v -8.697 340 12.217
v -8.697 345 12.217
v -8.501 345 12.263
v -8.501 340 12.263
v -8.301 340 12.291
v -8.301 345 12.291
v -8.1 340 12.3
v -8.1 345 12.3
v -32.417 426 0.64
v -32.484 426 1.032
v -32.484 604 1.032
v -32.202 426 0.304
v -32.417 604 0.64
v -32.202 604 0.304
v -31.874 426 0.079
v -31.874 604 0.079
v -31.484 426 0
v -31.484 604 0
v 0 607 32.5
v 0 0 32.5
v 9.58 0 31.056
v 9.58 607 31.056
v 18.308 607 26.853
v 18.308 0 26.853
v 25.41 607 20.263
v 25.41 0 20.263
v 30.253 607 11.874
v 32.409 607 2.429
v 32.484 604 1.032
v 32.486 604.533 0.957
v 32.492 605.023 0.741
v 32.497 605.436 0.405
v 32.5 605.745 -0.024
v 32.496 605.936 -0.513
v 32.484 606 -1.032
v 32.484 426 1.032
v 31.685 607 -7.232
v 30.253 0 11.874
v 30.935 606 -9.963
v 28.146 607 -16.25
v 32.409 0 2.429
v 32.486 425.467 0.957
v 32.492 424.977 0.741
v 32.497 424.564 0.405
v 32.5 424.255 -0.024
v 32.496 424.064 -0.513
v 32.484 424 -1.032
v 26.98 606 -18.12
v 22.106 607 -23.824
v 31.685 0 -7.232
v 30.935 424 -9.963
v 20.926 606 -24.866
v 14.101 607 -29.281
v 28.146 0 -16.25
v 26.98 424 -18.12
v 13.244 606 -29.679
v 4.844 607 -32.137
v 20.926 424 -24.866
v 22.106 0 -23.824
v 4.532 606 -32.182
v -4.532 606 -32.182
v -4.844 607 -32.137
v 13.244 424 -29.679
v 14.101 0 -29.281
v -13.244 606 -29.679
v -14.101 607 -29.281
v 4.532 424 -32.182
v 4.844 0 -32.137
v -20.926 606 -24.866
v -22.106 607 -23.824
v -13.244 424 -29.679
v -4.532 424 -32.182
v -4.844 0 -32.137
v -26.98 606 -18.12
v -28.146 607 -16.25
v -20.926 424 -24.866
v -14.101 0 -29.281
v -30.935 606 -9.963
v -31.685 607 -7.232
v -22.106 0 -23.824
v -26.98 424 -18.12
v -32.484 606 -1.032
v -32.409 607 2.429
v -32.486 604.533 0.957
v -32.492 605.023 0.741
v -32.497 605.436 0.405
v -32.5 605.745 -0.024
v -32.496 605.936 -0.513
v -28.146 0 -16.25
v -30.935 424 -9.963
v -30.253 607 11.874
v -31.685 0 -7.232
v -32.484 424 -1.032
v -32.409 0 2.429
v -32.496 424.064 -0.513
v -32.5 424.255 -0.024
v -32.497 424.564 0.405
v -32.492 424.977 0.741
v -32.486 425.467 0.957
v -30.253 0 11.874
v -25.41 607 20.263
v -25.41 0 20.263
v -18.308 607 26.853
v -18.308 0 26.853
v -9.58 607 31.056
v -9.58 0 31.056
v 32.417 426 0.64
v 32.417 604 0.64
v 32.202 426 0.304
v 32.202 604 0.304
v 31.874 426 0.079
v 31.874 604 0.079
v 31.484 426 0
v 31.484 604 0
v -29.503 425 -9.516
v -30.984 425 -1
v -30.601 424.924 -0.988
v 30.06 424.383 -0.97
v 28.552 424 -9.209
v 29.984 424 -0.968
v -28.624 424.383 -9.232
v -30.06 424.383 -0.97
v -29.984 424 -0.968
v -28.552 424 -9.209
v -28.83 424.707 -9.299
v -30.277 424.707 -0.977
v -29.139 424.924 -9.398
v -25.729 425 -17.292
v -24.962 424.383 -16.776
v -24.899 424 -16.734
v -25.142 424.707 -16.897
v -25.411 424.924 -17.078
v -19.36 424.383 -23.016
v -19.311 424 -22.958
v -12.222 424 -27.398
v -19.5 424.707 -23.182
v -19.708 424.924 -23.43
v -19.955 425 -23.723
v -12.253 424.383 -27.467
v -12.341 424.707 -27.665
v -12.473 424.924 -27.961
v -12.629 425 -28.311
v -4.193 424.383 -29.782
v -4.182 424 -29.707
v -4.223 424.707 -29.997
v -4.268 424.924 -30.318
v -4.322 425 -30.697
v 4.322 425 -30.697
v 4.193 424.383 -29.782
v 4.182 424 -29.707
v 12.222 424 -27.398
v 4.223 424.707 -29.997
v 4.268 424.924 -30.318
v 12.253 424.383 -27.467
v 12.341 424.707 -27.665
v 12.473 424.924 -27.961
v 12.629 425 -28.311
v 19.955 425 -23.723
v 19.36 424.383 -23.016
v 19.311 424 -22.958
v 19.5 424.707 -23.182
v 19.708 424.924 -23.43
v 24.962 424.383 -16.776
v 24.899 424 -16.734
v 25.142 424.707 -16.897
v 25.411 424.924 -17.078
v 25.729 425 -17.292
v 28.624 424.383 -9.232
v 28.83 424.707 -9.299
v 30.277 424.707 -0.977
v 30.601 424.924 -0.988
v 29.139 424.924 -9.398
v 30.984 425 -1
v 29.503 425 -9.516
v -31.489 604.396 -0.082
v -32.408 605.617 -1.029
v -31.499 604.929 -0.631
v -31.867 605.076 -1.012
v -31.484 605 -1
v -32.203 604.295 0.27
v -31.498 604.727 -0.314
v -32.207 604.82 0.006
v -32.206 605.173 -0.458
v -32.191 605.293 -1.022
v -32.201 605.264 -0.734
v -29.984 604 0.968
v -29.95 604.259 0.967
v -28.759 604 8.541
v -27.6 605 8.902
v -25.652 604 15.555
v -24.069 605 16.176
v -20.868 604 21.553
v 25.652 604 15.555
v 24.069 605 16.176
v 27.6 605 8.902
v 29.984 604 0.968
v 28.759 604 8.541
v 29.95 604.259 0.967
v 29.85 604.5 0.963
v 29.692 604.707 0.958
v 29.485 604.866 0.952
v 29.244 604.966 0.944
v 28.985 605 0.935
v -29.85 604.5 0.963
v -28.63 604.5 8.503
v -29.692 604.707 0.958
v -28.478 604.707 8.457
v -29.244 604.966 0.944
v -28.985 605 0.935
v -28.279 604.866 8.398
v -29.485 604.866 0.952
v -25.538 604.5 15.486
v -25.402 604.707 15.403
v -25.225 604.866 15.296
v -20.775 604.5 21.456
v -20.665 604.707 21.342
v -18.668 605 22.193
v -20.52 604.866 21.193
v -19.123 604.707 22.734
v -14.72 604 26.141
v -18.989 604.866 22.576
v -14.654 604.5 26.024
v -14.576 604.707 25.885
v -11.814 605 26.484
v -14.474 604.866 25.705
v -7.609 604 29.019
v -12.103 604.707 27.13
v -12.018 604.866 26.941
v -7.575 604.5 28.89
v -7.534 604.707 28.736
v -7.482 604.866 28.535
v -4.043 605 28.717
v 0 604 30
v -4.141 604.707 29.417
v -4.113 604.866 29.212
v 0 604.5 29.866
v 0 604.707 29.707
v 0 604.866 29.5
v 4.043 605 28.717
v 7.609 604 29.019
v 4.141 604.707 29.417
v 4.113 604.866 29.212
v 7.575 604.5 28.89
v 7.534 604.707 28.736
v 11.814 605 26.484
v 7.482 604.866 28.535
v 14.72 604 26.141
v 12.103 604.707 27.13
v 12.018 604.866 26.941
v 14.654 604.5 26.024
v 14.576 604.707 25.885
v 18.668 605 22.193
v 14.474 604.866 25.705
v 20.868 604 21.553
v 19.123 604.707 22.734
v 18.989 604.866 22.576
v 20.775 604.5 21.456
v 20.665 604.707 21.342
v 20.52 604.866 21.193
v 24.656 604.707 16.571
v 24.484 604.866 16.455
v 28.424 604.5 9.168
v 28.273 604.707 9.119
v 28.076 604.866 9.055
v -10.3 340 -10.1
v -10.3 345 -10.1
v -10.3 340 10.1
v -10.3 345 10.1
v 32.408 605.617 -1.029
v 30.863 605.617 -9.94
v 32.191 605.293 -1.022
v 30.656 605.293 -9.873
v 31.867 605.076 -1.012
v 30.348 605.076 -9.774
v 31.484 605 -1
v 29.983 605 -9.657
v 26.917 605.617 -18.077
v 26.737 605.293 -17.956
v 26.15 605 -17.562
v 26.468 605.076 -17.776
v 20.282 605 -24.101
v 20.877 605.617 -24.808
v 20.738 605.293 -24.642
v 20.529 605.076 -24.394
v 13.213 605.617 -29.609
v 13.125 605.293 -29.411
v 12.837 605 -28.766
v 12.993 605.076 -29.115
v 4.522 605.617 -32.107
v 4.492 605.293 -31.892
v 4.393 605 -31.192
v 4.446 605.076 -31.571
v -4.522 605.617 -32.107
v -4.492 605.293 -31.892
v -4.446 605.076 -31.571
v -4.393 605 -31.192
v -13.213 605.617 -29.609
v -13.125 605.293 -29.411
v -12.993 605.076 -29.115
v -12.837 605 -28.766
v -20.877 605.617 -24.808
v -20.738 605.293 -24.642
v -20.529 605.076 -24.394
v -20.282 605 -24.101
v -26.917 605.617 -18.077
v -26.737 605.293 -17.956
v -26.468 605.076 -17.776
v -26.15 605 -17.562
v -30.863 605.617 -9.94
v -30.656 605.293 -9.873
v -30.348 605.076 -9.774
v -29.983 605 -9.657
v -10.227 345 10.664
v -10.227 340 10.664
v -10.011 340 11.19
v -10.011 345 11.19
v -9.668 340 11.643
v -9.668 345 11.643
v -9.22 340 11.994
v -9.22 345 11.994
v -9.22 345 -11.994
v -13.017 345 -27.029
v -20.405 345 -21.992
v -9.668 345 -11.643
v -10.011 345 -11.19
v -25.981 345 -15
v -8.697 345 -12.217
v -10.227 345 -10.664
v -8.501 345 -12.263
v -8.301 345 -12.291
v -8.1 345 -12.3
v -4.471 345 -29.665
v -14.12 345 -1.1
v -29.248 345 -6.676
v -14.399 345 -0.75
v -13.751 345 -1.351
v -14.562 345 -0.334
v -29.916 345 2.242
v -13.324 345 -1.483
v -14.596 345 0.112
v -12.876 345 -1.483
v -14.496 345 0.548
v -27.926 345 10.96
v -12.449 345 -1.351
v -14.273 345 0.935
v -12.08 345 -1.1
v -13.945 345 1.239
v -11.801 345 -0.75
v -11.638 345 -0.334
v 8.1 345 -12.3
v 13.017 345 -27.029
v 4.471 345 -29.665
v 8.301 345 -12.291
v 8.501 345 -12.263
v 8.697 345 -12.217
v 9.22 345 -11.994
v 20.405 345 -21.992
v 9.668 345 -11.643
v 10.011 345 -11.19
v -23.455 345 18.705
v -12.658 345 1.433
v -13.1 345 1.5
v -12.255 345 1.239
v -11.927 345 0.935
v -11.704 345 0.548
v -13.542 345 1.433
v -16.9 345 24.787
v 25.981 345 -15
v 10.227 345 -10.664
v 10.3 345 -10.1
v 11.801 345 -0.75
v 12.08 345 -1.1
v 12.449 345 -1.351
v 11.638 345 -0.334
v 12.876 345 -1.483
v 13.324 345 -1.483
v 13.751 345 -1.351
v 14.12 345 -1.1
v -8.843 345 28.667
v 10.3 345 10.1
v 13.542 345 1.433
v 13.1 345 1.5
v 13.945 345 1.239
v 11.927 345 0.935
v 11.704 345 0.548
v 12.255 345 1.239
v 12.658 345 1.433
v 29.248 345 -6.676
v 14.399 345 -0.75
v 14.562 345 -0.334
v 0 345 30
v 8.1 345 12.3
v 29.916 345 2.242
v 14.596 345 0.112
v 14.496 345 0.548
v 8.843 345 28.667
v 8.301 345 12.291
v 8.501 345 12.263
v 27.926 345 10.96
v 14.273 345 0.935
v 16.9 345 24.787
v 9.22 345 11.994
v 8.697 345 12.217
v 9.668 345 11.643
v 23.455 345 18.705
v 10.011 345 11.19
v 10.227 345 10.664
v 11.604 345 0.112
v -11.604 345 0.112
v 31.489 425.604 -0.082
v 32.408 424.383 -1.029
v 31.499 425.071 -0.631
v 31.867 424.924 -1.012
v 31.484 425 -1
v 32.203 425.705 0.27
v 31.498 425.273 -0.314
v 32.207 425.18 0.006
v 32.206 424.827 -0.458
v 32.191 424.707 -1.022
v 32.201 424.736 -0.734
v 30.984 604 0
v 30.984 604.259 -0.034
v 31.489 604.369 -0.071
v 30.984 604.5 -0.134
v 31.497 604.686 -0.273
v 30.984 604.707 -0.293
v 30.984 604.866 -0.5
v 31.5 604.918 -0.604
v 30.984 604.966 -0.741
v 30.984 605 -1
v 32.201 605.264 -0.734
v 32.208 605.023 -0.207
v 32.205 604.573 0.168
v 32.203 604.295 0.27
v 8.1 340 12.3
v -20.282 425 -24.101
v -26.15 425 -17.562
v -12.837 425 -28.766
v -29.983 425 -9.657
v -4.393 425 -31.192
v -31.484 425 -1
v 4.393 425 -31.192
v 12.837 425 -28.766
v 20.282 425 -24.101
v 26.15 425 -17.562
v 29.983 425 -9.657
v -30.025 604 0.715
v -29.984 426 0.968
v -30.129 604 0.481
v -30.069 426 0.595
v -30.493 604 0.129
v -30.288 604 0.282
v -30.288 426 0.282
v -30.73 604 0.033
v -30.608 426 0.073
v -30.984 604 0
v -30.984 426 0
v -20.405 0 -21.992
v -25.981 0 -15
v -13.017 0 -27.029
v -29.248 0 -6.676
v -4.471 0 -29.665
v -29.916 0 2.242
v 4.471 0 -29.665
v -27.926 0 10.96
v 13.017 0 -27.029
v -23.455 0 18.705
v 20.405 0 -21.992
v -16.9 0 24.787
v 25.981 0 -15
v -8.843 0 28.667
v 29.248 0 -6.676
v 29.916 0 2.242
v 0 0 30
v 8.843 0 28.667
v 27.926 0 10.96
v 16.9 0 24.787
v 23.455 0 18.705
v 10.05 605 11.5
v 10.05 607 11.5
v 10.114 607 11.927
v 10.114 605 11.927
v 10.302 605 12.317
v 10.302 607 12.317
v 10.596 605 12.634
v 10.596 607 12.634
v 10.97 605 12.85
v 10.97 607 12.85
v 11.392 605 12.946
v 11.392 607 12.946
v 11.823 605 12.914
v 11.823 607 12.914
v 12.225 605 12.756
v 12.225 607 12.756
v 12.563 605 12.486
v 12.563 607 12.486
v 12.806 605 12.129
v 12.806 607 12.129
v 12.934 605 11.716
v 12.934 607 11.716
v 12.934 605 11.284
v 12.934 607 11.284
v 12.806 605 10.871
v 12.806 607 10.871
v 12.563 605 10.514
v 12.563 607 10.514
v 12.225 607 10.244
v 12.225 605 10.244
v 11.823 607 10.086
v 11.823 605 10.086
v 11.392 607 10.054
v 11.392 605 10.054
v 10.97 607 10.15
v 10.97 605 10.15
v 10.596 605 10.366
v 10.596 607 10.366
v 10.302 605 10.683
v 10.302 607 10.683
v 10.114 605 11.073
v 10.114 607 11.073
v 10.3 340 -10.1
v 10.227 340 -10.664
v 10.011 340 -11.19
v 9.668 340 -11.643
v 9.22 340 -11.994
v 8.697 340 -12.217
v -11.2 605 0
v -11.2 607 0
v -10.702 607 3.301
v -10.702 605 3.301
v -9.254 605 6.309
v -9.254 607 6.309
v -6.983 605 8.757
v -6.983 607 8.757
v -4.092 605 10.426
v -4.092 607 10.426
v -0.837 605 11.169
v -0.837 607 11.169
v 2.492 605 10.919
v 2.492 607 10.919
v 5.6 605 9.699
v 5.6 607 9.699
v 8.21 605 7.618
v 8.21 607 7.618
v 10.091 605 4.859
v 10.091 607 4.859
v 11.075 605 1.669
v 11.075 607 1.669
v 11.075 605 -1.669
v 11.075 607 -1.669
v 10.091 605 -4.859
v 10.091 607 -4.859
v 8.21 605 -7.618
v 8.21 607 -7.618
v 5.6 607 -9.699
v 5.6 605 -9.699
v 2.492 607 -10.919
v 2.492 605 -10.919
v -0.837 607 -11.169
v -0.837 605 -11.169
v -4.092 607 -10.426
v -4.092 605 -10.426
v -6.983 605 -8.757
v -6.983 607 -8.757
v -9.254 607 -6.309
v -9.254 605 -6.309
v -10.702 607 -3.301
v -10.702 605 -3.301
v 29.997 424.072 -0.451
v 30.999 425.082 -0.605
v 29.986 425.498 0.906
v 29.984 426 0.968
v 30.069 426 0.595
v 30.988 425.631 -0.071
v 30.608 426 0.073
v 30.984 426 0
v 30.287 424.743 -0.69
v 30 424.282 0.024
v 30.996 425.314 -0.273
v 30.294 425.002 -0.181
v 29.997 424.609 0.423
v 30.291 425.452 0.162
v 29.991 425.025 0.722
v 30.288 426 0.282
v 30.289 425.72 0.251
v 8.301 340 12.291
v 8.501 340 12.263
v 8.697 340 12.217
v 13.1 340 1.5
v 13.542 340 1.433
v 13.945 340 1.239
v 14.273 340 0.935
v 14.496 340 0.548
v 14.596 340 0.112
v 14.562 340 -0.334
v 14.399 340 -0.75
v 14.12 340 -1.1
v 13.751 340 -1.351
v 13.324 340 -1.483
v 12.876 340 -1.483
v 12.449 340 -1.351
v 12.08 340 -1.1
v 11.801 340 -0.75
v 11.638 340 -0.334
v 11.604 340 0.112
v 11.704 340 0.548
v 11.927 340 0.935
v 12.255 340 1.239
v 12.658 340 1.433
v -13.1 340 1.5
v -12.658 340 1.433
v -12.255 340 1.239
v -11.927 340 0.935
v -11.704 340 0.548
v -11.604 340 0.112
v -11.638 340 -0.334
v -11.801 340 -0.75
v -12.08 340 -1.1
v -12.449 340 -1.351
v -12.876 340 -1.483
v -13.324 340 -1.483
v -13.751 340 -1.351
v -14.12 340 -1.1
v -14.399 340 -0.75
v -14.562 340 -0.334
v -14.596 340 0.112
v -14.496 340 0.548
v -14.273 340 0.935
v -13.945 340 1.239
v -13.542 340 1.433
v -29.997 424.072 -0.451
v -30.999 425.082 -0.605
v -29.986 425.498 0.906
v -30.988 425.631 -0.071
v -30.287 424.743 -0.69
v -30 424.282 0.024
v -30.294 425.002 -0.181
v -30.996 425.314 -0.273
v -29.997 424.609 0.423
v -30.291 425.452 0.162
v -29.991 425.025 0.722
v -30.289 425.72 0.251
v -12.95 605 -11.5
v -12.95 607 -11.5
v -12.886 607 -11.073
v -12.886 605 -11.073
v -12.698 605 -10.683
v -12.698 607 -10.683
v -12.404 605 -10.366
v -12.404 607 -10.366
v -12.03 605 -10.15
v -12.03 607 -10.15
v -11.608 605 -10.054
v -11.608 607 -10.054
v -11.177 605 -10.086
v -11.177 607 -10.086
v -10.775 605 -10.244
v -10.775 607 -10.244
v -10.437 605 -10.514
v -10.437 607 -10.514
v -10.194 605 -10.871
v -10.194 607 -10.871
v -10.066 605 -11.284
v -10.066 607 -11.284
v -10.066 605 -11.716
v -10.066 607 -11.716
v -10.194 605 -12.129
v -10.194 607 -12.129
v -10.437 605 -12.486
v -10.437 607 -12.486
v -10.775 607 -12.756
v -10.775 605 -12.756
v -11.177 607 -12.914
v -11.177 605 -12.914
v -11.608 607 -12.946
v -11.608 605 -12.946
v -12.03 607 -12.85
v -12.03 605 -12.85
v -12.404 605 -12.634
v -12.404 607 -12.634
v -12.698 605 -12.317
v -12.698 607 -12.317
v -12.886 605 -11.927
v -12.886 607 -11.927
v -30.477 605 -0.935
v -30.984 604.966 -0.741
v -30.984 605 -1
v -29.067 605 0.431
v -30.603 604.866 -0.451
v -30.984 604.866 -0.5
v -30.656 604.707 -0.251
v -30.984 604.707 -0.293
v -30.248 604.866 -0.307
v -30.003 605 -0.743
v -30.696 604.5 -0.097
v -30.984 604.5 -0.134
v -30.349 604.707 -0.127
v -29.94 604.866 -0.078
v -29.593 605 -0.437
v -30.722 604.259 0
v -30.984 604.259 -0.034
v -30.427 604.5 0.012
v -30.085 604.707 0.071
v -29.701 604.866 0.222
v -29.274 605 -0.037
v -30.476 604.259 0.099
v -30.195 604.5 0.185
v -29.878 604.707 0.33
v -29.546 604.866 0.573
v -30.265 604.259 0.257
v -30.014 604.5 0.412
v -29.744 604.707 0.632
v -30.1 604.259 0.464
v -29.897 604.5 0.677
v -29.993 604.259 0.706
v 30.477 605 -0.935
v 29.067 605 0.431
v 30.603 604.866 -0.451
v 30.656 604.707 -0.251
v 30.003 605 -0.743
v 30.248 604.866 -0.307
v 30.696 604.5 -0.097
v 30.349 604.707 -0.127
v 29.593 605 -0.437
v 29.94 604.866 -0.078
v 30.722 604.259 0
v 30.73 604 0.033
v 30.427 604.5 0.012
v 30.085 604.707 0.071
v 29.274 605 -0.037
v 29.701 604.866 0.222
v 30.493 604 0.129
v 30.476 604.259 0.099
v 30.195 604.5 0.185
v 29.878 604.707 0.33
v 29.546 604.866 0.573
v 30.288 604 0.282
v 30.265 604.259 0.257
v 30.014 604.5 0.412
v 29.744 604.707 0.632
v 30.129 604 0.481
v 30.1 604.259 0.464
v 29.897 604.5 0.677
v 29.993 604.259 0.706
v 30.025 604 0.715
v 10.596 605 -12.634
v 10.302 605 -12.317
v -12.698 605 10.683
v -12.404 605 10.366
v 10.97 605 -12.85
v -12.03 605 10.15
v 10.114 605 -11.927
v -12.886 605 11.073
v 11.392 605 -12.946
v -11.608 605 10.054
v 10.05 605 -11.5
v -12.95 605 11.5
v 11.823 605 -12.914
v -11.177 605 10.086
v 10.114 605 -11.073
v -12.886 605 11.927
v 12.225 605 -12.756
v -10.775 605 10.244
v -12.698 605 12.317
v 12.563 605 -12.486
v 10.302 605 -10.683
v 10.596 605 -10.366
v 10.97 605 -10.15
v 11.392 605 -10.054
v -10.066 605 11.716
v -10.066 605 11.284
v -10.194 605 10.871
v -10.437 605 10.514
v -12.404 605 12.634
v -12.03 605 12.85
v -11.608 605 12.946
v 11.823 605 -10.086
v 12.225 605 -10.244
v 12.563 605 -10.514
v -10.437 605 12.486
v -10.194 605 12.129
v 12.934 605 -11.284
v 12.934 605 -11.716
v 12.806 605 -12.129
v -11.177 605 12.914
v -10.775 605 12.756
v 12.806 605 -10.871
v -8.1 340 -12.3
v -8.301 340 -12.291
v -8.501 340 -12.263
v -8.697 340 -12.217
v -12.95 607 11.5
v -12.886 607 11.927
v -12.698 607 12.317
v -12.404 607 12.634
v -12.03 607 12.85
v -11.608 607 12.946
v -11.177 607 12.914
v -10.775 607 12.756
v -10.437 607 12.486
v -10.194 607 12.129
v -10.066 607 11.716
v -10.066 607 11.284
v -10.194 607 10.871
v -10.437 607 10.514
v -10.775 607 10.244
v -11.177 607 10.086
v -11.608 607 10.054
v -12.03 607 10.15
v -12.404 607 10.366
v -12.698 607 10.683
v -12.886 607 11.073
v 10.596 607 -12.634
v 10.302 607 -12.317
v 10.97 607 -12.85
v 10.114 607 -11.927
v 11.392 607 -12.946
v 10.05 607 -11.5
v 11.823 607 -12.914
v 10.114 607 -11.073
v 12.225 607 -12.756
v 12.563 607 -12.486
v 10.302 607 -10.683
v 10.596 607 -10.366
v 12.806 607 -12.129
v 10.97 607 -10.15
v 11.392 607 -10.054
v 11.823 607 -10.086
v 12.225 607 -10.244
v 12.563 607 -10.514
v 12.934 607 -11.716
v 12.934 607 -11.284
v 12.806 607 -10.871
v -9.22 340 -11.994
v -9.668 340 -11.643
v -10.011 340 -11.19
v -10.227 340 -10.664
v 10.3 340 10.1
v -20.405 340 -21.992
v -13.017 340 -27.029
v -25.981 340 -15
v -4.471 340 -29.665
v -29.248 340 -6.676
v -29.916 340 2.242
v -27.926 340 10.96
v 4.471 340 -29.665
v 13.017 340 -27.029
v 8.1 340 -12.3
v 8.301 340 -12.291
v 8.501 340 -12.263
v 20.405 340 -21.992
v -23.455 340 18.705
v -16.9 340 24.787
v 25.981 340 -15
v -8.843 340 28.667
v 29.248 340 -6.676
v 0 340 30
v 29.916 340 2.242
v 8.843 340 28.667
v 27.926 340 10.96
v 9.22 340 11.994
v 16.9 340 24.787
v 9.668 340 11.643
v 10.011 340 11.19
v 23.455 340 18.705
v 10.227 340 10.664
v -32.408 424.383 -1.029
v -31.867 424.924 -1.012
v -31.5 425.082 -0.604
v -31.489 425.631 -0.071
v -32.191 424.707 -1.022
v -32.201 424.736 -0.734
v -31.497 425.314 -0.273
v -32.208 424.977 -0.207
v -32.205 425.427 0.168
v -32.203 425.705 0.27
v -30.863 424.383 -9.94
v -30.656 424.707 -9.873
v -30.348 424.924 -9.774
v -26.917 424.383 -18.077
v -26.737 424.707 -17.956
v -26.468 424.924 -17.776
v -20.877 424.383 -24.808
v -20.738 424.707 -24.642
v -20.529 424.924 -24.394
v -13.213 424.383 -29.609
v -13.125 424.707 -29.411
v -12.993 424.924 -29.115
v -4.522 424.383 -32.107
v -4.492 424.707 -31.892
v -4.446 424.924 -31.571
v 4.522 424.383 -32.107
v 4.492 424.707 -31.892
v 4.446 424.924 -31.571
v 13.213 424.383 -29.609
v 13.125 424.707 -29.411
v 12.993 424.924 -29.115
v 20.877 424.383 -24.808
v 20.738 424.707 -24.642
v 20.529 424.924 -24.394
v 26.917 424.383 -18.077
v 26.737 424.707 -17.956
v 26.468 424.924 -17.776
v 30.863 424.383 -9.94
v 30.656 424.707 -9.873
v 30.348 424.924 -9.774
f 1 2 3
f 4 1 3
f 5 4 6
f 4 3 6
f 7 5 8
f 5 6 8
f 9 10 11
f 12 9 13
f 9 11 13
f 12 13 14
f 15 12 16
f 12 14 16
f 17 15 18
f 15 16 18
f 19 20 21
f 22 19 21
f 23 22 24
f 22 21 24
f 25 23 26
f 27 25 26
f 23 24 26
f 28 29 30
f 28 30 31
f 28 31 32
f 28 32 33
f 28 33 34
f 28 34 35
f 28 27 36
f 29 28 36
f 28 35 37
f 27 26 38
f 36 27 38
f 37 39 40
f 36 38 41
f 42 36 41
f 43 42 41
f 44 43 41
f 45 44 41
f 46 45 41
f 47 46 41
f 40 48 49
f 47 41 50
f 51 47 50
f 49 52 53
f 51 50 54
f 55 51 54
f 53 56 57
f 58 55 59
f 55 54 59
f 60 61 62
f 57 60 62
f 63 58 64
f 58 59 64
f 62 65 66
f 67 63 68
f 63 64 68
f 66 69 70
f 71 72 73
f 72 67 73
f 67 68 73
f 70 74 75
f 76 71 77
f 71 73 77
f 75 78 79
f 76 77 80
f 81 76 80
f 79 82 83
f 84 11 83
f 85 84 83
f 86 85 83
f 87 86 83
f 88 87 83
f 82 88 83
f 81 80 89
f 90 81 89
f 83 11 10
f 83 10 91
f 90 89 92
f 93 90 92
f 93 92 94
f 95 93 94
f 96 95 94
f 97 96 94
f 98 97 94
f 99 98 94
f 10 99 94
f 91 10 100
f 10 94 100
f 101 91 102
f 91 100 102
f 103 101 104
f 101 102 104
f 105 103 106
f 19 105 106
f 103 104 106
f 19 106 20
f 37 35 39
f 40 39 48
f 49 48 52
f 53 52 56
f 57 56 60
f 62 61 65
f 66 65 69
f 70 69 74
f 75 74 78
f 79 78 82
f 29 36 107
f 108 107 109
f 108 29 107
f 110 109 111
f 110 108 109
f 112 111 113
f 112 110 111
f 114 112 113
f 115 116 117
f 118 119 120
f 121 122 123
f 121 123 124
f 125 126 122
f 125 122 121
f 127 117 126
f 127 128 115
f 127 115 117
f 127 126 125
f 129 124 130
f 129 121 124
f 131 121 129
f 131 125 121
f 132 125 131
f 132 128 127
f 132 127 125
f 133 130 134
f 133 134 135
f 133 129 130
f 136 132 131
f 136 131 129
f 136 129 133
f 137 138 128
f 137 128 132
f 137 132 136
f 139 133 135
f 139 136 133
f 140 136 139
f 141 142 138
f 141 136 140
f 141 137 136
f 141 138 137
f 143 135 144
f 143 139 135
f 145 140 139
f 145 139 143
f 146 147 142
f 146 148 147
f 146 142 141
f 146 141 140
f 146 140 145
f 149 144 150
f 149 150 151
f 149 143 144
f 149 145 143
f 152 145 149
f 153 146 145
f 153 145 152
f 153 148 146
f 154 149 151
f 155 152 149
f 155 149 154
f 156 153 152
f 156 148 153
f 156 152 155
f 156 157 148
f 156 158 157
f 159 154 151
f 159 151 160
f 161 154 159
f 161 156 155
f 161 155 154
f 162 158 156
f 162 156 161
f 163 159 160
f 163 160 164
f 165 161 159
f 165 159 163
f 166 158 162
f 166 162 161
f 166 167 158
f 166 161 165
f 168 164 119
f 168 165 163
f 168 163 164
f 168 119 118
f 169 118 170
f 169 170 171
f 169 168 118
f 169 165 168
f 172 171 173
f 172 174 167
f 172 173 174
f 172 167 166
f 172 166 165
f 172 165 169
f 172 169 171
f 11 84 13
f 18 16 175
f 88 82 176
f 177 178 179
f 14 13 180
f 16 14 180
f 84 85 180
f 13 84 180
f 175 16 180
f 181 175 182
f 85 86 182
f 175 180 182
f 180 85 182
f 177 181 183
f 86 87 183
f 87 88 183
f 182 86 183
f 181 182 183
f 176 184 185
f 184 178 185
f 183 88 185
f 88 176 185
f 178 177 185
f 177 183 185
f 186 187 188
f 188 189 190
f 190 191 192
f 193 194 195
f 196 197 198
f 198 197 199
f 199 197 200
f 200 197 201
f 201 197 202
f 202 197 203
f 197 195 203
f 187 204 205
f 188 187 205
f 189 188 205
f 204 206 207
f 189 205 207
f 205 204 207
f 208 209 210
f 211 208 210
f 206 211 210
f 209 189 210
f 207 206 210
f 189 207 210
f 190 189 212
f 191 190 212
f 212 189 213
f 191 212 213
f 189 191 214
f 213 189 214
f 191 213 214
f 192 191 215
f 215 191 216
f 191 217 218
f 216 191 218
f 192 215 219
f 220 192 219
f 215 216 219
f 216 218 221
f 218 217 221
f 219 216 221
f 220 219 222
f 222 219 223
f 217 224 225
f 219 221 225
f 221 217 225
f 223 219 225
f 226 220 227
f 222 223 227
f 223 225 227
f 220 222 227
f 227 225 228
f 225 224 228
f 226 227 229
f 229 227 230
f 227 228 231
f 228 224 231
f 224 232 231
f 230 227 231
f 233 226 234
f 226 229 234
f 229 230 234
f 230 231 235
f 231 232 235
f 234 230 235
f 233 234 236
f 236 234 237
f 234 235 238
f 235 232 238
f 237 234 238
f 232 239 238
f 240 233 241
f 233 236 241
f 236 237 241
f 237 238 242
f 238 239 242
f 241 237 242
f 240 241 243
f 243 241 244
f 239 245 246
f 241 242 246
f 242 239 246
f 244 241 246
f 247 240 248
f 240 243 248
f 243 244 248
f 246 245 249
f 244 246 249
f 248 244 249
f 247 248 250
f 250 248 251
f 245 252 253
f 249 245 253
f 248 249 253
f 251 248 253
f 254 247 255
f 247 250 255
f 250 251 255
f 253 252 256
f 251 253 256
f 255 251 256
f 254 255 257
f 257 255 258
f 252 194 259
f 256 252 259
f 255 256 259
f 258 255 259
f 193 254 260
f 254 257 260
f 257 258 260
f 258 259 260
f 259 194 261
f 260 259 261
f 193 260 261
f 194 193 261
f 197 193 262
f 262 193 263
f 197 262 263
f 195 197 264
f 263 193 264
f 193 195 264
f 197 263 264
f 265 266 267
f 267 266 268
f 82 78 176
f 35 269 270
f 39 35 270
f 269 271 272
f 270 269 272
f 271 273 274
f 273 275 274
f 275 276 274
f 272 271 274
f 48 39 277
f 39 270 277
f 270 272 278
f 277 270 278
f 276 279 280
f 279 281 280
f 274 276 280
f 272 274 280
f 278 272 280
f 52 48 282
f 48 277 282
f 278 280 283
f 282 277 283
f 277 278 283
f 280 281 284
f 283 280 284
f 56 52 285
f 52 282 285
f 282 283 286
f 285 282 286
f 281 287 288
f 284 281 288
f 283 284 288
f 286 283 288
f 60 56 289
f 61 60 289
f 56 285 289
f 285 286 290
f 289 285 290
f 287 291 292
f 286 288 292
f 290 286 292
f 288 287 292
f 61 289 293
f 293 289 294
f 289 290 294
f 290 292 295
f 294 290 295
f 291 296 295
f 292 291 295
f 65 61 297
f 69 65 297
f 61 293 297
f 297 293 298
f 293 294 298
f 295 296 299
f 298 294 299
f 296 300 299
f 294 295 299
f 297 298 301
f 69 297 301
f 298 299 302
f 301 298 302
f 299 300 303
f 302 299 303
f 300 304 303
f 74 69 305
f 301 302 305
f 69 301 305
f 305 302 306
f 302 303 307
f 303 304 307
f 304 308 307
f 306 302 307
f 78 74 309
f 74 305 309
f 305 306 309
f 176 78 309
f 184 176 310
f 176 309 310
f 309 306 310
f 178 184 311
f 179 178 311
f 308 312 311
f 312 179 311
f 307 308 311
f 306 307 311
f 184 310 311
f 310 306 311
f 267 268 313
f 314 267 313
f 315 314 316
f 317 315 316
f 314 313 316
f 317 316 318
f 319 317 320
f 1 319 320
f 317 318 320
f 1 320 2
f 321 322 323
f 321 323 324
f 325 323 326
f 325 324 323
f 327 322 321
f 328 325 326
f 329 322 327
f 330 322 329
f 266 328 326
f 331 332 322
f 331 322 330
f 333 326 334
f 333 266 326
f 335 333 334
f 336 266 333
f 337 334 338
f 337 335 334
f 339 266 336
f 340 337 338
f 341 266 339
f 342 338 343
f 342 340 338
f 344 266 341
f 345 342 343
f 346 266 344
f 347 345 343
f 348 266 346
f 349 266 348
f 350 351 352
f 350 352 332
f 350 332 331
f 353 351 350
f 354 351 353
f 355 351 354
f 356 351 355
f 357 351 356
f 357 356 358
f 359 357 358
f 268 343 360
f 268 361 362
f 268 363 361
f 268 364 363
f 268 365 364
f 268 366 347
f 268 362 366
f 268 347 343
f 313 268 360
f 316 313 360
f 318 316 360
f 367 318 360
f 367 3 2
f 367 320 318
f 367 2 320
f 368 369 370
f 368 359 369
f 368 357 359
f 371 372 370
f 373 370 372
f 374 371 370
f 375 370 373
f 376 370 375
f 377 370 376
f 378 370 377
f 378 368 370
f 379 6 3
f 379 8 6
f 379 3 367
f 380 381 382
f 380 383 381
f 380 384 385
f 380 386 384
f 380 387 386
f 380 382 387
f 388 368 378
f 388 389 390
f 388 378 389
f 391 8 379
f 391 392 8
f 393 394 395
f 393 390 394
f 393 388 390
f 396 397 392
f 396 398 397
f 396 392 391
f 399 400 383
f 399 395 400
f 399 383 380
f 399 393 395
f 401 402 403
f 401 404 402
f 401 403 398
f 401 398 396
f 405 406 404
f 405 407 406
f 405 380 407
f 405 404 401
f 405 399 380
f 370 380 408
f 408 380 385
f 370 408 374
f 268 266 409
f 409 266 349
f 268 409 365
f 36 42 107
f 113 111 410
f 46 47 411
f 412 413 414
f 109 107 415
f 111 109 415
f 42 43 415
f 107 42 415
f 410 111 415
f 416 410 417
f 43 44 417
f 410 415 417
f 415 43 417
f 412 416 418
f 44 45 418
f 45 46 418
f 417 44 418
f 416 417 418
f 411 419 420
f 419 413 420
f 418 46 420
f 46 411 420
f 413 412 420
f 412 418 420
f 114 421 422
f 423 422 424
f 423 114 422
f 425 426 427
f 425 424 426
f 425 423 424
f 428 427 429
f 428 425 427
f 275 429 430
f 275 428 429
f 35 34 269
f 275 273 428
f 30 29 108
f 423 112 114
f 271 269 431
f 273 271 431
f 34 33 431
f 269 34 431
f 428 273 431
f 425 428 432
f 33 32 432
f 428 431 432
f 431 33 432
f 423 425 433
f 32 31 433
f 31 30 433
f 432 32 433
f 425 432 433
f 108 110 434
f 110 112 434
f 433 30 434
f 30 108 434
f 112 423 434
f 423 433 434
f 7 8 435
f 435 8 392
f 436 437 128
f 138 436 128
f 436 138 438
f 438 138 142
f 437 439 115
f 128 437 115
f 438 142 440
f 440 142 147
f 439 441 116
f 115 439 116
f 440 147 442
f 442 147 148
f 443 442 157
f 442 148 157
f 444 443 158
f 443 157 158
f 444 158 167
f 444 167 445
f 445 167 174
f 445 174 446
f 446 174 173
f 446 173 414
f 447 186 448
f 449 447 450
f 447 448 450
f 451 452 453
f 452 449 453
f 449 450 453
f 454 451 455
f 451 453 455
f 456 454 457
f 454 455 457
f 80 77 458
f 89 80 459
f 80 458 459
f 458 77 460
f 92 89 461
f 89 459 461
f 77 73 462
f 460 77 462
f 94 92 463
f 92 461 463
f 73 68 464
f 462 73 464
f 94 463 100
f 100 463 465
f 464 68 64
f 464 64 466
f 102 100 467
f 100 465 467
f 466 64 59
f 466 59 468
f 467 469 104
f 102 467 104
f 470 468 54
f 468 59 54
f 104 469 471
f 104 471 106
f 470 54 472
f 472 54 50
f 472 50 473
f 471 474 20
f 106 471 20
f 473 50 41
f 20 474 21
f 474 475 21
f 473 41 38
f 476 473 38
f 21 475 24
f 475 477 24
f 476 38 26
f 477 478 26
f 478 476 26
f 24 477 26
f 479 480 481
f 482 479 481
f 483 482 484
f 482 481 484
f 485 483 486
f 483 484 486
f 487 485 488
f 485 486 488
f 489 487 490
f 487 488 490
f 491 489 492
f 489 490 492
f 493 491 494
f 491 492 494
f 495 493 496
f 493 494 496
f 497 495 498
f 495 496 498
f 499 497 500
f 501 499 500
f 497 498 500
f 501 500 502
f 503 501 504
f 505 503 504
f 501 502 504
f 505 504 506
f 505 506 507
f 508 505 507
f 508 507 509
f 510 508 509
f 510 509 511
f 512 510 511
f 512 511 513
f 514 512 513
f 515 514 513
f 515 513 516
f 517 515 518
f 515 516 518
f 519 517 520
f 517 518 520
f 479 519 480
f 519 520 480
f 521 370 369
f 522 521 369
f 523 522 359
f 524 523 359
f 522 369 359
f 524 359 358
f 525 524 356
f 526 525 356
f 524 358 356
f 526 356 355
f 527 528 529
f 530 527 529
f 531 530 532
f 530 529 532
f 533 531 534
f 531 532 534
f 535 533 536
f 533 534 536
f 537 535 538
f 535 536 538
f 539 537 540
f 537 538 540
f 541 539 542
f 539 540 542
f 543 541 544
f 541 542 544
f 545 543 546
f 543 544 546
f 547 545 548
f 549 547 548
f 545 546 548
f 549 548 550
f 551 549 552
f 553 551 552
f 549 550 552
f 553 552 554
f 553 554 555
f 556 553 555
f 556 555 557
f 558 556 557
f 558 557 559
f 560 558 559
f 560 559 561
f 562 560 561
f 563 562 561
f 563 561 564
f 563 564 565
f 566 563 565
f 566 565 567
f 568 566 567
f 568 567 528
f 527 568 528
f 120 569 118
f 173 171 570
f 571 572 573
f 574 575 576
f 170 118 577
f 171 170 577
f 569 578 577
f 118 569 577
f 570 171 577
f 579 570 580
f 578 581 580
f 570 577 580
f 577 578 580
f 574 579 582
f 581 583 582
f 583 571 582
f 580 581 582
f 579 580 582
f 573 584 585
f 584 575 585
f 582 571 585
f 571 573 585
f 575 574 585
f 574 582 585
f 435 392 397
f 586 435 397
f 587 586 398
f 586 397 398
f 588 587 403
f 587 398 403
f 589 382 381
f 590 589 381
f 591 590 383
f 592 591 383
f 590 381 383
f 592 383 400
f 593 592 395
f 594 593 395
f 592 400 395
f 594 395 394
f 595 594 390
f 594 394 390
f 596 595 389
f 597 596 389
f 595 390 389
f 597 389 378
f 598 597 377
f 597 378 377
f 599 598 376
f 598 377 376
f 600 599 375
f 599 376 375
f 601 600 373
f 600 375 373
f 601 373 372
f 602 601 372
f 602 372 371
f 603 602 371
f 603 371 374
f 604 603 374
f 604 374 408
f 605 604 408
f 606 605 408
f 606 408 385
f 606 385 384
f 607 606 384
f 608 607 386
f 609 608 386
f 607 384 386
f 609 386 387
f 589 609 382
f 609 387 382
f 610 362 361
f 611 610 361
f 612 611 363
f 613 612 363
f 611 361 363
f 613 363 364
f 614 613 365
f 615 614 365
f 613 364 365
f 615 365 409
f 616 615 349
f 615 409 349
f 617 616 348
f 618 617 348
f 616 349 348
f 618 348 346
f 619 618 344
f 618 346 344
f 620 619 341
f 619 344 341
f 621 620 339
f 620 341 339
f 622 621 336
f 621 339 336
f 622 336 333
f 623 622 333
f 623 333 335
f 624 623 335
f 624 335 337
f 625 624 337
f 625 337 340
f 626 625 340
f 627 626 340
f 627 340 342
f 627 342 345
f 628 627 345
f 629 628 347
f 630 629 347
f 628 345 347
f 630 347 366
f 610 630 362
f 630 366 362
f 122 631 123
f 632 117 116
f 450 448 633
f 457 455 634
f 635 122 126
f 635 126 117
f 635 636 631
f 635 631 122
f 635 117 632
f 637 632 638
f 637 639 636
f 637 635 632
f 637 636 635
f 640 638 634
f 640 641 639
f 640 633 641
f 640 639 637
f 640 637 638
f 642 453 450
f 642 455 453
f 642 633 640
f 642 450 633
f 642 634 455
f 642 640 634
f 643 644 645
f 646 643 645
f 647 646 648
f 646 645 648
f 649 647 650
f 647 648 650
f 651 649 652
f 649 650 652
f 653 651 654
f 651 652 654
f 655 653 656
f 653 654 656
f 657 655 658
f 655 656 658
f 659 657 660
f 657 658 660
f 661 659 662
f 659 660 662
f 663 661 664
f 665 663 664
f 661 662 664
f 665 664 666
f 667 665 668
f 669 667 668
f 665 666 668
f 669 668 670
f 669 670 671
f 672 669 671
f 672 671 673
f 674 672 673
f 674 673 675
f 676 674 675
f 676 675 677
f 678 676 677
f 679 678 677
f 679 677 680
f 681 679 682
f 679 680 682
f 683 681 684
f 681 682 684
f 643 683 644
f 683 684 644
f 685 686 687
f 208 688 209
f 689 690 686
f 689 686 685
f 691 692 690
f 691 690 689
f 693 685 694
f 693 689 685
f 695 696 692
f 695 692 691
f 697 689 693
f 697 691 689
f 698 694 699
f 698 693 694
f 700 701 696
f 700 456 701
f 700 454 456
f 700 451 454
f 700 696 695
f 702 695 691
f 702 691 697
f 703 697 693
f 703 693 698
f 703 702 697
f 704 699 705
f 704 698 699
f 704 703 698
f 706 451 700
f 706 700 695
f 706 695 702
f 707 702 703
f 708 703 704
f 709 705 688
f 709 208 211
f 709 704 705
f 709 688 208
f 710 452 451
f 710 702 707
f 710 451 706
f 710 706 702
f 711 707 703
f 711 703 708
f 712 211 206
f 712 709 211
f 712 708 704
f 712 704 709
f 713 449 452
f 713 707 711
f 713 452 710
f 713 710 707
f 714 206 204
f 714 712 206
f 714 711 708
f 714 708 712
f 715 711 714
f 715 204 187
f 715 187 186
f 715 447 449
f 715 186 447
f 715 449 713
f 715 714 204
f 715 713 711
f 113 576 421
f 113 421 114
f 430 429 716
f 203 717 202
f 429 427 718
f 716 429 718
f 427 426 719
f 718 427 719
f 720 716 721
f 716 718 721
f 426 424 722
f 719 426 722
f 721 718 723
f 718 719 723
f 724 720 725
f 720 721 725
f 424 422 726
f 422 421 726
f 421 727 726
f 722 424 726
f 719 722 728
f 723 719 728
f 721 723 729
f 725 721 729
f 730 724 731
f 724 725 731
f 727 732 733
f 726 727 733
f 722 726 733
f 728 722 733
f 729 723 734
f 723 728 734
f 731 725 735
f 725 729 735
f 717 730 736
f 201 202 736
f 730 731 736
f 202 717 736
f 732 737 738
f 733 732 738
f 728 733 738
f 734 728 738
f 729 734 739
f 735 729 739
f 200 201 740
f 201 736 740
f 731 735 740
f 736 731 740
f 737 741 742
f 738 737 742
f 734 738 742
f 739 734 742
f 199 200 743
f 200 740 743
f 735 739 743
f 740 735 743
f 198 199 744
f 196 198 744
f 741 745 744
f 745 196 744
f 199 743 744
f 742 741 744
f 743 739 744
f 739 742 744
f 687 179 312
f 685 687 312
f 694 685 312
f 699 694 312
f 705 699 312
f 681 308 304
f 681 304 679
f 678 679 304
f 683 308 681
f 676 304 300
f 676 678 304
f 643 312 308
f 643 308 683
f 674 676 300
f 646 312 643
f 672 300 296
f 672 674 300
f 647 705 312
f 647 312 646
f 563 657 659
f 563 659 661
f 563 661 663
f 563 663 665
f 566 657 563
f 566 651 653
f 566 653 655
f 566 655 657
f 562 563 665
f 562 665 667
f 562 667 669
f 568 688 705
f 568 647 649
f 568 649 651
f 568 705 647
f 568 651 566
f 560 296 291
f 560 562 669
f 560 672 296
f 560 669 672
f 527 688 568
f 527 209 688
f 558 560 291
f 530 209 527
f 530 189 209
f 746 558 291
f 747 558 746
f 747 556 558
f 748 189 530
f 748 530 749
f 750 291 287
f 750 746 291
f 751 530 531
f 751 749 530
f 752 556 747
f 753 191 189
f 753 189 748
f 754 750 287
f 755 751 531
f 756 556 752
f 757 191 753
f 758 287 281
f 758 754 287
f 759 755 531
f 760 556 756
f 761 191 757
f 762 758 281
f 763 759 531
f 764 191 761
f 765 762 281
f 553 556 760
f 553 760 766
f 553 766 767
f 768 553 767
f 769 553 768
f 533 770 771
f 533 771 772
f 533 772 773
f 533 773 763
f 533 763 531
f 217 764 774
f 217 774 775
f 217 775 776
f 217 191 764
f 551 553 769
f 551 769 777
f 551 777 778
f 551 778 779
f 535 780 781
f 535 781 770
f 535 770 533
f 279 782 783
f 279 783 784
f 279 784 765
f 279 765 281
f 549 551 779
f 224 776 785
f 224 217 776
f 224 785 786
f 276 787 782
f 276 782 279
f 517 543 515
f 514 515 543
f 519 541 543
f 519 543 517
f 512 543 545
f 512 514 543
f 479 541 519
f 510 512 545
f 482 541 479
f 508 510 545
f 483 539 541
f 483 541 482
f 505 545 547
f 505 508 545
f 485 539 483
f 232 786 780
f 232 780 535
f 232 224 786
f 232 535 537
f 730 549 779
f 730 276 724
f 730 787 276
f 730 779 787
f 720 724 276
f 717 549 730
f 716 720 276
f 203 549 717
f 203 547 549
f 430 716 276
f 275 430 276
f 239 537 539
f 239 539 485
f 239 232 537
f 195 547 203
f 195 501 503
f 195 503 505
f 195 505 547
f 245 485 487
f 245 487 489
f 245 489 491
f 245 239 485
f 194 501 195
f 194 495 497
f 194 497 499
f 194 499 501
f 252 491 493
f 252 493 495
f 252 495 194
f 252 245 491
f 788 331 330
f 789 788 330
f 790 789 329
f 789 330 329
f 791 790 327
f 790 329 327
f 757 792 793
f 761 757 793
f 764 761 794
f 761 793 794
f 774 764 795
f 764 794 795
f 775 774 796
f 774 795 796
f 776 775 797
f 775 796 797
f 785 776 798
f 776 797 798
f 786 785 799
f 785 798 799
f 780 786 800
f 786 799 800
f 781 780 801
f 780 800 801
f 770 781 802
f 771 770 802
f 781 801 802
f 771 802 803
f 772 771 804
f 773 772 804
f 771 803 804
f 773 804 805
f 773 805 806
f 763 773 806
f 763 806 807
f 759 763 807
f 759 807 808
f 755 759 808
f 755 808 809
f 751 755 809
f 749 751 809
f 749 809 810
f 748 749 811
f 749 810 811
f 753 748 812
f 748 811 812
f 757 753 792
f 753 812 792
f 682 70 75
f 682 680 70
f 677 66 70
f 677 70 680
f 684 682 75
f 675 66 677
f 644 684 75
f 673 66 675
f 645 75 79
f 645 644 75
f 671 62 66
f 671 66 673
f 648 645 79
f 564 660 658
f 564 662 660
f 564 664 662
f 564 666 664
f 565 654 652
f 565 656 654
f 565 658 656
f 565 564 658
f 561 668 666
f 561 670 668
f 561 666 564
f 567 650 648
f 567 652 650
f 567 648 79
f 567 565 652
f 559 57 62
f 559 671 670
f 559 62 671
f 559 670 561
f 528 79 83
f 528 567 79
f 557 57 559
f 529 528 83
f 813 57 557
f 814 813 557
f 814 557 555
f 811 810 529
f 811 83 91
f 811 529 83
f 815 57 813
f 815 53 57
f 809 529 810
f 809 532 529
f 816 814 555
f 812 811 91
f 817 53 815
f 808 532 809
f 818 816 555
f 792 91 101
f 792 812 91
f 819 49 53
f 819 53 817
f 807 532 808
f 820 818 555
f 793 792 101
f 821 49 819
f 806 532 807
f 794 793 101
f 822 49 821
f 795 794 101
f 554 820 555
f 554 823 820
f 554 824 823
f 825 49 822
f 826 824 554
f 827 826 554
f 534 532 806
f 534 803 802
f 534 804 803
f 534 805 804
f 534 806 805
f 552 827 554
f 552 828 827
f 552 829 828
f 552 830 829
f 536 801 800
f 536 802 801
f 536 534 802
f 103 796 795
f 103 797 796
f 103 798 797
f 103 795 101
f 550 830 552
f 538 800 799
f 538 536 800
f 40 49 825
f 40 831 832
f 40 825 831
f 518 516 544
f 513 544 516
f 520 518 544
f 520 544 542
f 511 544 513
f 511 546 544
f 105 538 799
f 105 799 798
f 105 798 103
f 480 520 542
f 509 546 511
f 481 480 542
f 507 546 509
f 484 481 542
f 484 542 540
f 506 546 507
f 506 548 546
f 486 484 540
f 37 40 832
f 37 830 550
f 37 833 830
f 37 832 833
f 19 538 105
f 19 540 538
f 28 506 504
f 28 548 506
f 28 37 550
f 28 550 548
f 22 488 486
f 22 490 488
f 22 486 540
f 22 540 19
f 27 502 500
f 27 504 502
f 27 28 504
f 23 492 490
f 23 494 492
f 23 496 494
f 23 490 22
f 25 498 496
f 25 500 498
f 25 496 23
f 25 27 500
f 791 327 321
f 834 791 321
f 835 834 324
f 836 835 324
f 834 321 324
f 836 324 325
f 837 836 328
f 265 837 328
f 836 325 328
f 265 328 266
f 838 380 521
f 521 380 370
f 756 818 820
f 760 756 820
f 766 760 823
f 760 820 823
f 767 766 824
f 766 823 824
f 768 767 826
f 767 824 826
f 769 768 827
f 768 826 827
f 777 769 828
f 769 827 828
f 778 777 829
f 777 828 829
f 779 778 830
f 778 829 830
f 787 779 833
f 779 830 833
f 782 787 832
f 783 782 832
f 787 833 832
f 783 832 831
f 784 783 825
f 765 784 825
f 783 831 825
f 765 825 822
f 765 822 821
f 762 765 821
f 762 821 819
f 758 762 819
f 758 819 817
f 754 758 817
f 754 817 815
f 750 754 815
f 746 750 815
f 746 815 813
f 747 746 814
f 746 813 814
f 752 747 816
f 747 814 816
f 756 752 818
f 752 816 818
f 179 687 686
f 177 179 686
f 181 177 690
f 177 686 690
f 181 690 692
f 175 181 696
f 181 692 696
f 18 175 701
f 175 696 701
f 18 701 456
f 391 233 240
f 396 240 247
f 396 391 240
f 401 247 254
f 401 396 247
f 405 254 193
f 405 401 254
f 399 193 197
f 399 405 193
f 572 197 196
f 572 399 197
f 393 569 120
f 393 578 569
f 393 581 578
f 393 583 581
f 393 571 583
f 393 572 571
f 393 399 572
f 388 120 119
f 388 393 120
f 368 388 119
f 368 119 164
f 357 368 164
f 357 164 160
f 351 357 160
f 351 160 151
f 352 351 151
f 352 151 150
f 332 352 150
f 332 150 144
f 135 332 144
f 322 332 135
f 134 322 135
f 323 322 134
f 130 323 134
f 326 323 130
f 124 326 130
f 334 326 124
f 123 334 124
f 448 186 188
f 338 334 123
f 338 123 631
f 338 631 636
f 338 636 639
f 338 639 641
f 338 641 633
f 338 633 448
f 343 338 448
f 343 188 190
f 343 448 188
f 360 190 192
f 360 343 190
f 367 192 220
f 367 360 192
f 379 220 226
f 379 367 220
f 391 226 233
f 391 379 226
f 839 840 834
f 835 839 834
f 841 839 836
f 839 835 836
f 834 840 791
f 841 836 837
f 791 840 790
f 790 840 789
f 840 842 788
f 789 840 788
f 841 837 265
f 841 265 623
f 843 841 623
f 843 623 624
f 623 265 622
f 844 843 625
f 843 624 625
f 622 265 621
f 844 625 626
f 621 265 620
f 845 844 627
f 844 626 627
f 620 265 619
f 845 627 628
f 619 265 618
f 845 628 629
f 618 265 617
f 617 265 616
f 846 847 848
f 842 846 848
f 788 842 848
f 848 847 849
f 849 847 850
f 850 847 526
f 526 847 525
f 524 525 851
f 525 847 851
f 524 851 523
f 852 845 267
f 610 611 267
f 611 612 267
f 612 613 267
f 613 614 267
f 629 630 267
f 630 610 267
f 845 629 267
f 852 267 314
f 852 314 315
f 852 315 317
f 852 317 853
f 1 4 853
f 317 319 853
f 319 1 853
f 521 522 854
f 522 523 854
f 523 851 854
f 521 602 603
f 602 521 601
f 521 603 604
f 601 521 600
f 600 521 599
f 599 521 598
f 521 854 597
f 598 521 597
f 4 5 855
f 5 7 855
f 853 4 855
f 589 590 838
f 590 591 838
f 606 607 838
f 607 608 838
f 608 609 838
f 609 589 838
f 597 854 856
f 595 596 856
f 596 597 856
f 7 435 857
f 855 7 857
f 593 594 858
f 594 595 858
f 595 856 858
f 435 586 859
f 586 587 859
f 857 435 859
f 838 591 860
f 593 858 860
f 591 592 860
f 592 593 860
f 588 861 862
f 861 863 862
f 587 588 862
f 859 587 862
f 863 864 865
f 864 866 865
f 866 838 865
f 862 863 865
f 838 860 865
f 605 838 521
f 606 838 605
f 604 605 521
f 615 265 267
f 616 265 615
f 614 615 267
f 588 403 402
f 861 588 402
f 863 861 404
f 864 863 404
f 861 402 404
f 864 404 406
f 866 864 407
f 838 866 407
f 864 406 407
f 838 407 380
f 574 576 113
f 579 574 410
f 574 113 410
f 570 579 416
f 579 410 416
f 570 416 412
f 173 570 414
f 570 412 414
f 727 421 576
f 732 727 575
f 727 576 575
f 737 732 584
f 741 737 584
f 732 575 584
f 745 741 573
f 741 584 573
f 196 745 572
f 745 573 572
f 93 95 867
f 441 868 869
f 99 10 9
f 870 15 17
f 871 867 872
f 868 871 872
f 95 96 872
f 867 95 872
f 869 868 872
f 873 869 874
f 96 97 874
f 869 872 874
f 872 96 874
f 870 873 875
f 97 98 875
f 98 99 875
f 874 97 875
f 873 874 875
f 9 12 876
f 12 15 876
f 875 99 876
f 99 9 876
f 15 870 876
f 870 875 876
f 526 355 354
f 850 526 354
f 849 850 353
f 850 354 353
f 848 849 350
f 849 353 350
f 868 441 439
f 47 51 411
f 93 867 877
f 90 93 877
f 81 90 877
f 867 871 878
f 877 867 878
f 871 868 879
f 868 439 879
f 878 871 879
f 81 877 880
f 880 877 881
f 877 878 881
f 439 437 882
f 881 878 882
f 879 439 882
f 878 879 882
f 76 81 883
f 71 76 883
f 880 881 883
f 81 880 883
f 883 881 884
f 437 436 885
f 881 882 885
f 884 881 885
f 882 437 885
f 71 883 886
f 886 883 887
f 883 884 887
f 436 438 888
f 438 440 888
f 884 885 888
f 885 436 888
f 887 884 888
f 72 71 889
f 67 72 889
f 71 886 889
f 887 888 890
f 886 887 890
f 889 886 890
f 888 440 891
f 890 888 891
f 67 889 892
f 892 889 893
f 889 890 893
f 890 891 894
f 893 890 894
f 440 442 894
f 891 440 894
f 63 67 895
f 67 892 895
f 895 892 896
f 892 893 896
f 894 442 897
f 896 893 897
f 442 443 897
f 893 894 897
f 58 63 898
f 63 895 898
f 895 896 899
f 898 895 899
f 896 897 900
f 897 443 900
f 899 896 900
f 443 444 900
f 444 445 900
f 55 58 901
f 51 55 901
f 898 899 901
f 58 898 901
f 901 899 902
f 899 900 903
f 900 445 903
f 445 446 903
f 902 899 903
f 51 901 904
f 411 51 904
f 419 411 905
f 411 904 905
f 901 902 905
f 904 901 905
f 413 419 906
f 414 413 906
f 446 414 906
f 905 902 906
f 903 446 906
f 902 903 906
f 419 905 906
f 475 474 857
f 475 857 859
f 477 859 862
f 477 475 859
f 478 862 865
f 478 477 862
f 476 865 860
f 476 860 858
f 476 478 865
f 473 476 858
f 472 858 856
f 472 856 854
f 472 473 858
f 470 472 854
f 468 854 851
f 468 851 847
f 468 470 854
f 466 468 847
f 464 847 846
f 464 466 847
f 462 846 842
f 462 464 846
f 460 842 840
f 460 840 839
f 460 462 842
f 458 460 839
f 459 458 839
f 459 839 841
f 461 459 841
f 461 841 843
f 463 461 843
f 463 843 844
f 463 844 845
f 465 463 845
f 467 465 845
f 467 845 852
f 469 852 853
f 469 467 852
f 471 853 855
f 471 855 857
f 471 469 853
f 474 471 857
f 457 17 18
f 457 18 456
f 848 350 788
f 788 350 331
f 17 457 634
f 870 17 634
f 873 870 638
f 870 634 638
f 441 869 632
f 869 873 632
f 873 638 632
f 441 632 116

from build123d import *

# Parameters (mm, degrees)
SKETCH_1_R          = 32.5
SKETCH_1_R_2        = 30
EXTRUDE_1_DEPTH     = 340
SKETCH_2_R          = 32.5
EXTRUDE_2_DEPTH     = 5
SKETCH_8_R          = 1.5
CUT_EXTRUDE_2_DEPTH = 5
SKETCH_9_R          = 32.5
SKETCH_9_R_2        = 30
EXTRUDE_3_DEPTH     = 260
SKETCH_10_R         = 32.5
EXTRUDE_4_DEPTH     = 2
CUT_EXTRUDE_3_DEPTH = 2
SKETCH_14_W         = 65
SKETCH_14_H         = 180
CUT_EXTRUDE_4_DEPTH = 32.5
FILLET_1_R          = 1


with BuildPart() as part:
    # 草图1 → 凸台-拉伸1 (new body)
    with BuildSketch(Plane(origin=(0, 0, 0), x_dir=(1, 0, 0), z_dir=(0, 1, 0))):
        with Locations(Location((0, 0, 0), (0, 0, 270))):
            Circle(SKETCH_1_R)
        with Locations(Location((0, 0, 0), (0, 0, 270))):
            Circle(SKETCH_1_R_2, mode=Mode.SUBTRACT)
    extrude(amount=EXTRUDE_1_DEPTH)

    # 草图2 → 凸台-拉伸2 (add)
    with BuildSketch(Plane(origin=(0, 340, 0), x_dir=(1, 0, 0), z_dir=(0, 1, 0))):
        with Locations(Location((0, 0, 0), (0, 0, 270))):
            Circle(SKETCH_2_R)
    extrude(amount=EXTRUDE_2_DEPTH)

    # 草图8 → 切除-拉伸2 (cut)
    with BuildSketch(Plane(origin=(0, 345, 0), x_dir=(1, 0, 0), z_dir=(0, 1, 0))):
        with Locations(Location((-13.1, 0, 0), (0, 0, 270))):
            Circle(SKETCH_8_R)
        with Locations(Location((13.1, 0, 0), (0, 0, 270))):
            Circle(SKETCH_8_R)
        with BuildLine():
            Line((10.3, -10.1), (10.3, 10.1))
            ThreePointArc((10.3, 10.1), (9.854035247, 11.427915792), (8.696945136, 12.217464641))
            ThreePointArc((8.696945136, 12.217464641), (8.401311956, 12.279268479), (8.1, 12.3))
            Line((8.1, 12.3), (-8.1, 12.3))
            ThreePointArc((-8.1, 12.3), (-8.401311956, 12.279268479), (-8.696945136, 12.217464641))
            ThreePointArc((-8.696945136, 12.217464641), (-9.854035247, 11.427915792), (-10.3, 10.1))
            Line((-10.3, 10.1), (-10.3, -10.1))
            ThreePointArc((-10.3, -10.1), (-9.854035247, -11.427915792), (-8.696945136, -12.217464641))
            ThreePointArc((-8.696945136, -12.217464641), (-8.401311956, -12.279268479), (-8.1, -12.3))
            Line((-8.1, -12.3), (8.1, -12.3))
            ThreePointArc((8.1, -12.3), (8.401311956, -12.279268479), (8.696945136, -12.217464641))
            ThreePointArc((8.696945136, -12.217464641), (9.854035247, -11.427915792), (10.3, -10.1))
        make_face()
    extrude(amount=-CUT_EXTRUDE_2_DEPTH, mode=Mode.SUBTRACT)

    # 草图9 → 凸台-拉伸3 (add)
    with BuildSketch(Plane(origin=(0, 345, 0), x_dir=(1, 0, 0), z_dir=(0, 1, 0))):
        with Locations(Location((0, 0, 0), (0, 0, 270))):
            Circle(SKETCH_9_R)
        with Locations(Location((0, 0, 0), (0, 0, 270))):
            Circle(SKETCH_9_R_2, mode=Mode.SUBTRACT)
    extrude(amount=EXTRUDE_3_DEPTH)

    # 草图10 → 凸台-拉伸4 (add)
    with BuildSketch(Plane(origin=(0, 605, 0), x_dir=(1, 0, 0), z_dir=(0, 1, 0))):
        with Locations(Location((0, 0, 0), (0, 0, 270))):
            Circle(SKETCH_10_R)
    extrude(amount=EXTRUDE_4_DEPTH)

    # 草图12 → 切除-拉伸3 (cut)
    with BuildSketch(Plane(origin=(0, 607, 0), x_dir=(1, 0, 0), z_dir=(0, 1, 0))):
        with BuildLine():
            ThreePointArc((12.95, 11.5), (11.5, 12.95), (10.05, 11.5))
            ThreePointArc((10.05, 11.5), (11.5, 10.05), (12.95, 11.5))
        make_face()
        with BuildLine():
            ThreePointArc((12.95, -11.5), (11.5, -10.05), (10.05, -11.5))
            ThreePointArc((10.05, -11.5), (11.5, -12.95), (12.95, -11.5))
        make_face()
        with BuildLine():
            ThreePointArc((11.2, 0), (0, 11.2), (-11.2, 0))
            ThreePointArc((-11.2, 0), (0, -11.2), (11.2, 0))
        make_face()
        with BuildLine():
            ThreePointArc((-10.05, -11.5), (-11.5, -10.05), (-12.95, -11.5))
            ThreePointArc((-12.95, -11.5), (-11.5, -12.95), (-10.05, -11.5))
        make_face()
        with BuildLine():
            ThreePointArc((-10.05, 11.5), (-11.5, 12.95), (-12.95, 11.5))
            ThreePointArc((-12.95, 11.5), (-11.5, 10.05), (-10.05, 11.5))
        make_face()
    extrude(amount=-CUT_EXTRUDE_3_DEPTH, mode=Mode.SUBTRACT)

    # 草图14 → 切除-拉伸4 (cut)
    with BuildSketch(Plane.XY):
        with Locations((0, 515)):
            Rectangle(SKETCH_14_W, SKETCH_14_H)
    extrude(amount=-CUT_EXTRUDE_4_DEPTH, mode=Mode.SUBTRACT)

    # 圆角1
    fillet_1_edges = [part.edges().sort_by_distance(p)[0] for p in [
        (0, 425, -32.5),
        (-30, 515, 0),
        (30, 515, 0),
        (-31.25, 605, 0),
        (-32.5, 515, 0),
        (-31.25, 425, 0),
        (0, 605, -32.5),
        (31.25, 425, 0),
        (32.5, 515, 0),
        (31.25, 605, 0),
        (21.213203436, 605, 21.213203436),
        (0, 425, -30),
    ]]
    fillet(fillet_1_edges, radius=FILLET_1_R)


solid = part.part
